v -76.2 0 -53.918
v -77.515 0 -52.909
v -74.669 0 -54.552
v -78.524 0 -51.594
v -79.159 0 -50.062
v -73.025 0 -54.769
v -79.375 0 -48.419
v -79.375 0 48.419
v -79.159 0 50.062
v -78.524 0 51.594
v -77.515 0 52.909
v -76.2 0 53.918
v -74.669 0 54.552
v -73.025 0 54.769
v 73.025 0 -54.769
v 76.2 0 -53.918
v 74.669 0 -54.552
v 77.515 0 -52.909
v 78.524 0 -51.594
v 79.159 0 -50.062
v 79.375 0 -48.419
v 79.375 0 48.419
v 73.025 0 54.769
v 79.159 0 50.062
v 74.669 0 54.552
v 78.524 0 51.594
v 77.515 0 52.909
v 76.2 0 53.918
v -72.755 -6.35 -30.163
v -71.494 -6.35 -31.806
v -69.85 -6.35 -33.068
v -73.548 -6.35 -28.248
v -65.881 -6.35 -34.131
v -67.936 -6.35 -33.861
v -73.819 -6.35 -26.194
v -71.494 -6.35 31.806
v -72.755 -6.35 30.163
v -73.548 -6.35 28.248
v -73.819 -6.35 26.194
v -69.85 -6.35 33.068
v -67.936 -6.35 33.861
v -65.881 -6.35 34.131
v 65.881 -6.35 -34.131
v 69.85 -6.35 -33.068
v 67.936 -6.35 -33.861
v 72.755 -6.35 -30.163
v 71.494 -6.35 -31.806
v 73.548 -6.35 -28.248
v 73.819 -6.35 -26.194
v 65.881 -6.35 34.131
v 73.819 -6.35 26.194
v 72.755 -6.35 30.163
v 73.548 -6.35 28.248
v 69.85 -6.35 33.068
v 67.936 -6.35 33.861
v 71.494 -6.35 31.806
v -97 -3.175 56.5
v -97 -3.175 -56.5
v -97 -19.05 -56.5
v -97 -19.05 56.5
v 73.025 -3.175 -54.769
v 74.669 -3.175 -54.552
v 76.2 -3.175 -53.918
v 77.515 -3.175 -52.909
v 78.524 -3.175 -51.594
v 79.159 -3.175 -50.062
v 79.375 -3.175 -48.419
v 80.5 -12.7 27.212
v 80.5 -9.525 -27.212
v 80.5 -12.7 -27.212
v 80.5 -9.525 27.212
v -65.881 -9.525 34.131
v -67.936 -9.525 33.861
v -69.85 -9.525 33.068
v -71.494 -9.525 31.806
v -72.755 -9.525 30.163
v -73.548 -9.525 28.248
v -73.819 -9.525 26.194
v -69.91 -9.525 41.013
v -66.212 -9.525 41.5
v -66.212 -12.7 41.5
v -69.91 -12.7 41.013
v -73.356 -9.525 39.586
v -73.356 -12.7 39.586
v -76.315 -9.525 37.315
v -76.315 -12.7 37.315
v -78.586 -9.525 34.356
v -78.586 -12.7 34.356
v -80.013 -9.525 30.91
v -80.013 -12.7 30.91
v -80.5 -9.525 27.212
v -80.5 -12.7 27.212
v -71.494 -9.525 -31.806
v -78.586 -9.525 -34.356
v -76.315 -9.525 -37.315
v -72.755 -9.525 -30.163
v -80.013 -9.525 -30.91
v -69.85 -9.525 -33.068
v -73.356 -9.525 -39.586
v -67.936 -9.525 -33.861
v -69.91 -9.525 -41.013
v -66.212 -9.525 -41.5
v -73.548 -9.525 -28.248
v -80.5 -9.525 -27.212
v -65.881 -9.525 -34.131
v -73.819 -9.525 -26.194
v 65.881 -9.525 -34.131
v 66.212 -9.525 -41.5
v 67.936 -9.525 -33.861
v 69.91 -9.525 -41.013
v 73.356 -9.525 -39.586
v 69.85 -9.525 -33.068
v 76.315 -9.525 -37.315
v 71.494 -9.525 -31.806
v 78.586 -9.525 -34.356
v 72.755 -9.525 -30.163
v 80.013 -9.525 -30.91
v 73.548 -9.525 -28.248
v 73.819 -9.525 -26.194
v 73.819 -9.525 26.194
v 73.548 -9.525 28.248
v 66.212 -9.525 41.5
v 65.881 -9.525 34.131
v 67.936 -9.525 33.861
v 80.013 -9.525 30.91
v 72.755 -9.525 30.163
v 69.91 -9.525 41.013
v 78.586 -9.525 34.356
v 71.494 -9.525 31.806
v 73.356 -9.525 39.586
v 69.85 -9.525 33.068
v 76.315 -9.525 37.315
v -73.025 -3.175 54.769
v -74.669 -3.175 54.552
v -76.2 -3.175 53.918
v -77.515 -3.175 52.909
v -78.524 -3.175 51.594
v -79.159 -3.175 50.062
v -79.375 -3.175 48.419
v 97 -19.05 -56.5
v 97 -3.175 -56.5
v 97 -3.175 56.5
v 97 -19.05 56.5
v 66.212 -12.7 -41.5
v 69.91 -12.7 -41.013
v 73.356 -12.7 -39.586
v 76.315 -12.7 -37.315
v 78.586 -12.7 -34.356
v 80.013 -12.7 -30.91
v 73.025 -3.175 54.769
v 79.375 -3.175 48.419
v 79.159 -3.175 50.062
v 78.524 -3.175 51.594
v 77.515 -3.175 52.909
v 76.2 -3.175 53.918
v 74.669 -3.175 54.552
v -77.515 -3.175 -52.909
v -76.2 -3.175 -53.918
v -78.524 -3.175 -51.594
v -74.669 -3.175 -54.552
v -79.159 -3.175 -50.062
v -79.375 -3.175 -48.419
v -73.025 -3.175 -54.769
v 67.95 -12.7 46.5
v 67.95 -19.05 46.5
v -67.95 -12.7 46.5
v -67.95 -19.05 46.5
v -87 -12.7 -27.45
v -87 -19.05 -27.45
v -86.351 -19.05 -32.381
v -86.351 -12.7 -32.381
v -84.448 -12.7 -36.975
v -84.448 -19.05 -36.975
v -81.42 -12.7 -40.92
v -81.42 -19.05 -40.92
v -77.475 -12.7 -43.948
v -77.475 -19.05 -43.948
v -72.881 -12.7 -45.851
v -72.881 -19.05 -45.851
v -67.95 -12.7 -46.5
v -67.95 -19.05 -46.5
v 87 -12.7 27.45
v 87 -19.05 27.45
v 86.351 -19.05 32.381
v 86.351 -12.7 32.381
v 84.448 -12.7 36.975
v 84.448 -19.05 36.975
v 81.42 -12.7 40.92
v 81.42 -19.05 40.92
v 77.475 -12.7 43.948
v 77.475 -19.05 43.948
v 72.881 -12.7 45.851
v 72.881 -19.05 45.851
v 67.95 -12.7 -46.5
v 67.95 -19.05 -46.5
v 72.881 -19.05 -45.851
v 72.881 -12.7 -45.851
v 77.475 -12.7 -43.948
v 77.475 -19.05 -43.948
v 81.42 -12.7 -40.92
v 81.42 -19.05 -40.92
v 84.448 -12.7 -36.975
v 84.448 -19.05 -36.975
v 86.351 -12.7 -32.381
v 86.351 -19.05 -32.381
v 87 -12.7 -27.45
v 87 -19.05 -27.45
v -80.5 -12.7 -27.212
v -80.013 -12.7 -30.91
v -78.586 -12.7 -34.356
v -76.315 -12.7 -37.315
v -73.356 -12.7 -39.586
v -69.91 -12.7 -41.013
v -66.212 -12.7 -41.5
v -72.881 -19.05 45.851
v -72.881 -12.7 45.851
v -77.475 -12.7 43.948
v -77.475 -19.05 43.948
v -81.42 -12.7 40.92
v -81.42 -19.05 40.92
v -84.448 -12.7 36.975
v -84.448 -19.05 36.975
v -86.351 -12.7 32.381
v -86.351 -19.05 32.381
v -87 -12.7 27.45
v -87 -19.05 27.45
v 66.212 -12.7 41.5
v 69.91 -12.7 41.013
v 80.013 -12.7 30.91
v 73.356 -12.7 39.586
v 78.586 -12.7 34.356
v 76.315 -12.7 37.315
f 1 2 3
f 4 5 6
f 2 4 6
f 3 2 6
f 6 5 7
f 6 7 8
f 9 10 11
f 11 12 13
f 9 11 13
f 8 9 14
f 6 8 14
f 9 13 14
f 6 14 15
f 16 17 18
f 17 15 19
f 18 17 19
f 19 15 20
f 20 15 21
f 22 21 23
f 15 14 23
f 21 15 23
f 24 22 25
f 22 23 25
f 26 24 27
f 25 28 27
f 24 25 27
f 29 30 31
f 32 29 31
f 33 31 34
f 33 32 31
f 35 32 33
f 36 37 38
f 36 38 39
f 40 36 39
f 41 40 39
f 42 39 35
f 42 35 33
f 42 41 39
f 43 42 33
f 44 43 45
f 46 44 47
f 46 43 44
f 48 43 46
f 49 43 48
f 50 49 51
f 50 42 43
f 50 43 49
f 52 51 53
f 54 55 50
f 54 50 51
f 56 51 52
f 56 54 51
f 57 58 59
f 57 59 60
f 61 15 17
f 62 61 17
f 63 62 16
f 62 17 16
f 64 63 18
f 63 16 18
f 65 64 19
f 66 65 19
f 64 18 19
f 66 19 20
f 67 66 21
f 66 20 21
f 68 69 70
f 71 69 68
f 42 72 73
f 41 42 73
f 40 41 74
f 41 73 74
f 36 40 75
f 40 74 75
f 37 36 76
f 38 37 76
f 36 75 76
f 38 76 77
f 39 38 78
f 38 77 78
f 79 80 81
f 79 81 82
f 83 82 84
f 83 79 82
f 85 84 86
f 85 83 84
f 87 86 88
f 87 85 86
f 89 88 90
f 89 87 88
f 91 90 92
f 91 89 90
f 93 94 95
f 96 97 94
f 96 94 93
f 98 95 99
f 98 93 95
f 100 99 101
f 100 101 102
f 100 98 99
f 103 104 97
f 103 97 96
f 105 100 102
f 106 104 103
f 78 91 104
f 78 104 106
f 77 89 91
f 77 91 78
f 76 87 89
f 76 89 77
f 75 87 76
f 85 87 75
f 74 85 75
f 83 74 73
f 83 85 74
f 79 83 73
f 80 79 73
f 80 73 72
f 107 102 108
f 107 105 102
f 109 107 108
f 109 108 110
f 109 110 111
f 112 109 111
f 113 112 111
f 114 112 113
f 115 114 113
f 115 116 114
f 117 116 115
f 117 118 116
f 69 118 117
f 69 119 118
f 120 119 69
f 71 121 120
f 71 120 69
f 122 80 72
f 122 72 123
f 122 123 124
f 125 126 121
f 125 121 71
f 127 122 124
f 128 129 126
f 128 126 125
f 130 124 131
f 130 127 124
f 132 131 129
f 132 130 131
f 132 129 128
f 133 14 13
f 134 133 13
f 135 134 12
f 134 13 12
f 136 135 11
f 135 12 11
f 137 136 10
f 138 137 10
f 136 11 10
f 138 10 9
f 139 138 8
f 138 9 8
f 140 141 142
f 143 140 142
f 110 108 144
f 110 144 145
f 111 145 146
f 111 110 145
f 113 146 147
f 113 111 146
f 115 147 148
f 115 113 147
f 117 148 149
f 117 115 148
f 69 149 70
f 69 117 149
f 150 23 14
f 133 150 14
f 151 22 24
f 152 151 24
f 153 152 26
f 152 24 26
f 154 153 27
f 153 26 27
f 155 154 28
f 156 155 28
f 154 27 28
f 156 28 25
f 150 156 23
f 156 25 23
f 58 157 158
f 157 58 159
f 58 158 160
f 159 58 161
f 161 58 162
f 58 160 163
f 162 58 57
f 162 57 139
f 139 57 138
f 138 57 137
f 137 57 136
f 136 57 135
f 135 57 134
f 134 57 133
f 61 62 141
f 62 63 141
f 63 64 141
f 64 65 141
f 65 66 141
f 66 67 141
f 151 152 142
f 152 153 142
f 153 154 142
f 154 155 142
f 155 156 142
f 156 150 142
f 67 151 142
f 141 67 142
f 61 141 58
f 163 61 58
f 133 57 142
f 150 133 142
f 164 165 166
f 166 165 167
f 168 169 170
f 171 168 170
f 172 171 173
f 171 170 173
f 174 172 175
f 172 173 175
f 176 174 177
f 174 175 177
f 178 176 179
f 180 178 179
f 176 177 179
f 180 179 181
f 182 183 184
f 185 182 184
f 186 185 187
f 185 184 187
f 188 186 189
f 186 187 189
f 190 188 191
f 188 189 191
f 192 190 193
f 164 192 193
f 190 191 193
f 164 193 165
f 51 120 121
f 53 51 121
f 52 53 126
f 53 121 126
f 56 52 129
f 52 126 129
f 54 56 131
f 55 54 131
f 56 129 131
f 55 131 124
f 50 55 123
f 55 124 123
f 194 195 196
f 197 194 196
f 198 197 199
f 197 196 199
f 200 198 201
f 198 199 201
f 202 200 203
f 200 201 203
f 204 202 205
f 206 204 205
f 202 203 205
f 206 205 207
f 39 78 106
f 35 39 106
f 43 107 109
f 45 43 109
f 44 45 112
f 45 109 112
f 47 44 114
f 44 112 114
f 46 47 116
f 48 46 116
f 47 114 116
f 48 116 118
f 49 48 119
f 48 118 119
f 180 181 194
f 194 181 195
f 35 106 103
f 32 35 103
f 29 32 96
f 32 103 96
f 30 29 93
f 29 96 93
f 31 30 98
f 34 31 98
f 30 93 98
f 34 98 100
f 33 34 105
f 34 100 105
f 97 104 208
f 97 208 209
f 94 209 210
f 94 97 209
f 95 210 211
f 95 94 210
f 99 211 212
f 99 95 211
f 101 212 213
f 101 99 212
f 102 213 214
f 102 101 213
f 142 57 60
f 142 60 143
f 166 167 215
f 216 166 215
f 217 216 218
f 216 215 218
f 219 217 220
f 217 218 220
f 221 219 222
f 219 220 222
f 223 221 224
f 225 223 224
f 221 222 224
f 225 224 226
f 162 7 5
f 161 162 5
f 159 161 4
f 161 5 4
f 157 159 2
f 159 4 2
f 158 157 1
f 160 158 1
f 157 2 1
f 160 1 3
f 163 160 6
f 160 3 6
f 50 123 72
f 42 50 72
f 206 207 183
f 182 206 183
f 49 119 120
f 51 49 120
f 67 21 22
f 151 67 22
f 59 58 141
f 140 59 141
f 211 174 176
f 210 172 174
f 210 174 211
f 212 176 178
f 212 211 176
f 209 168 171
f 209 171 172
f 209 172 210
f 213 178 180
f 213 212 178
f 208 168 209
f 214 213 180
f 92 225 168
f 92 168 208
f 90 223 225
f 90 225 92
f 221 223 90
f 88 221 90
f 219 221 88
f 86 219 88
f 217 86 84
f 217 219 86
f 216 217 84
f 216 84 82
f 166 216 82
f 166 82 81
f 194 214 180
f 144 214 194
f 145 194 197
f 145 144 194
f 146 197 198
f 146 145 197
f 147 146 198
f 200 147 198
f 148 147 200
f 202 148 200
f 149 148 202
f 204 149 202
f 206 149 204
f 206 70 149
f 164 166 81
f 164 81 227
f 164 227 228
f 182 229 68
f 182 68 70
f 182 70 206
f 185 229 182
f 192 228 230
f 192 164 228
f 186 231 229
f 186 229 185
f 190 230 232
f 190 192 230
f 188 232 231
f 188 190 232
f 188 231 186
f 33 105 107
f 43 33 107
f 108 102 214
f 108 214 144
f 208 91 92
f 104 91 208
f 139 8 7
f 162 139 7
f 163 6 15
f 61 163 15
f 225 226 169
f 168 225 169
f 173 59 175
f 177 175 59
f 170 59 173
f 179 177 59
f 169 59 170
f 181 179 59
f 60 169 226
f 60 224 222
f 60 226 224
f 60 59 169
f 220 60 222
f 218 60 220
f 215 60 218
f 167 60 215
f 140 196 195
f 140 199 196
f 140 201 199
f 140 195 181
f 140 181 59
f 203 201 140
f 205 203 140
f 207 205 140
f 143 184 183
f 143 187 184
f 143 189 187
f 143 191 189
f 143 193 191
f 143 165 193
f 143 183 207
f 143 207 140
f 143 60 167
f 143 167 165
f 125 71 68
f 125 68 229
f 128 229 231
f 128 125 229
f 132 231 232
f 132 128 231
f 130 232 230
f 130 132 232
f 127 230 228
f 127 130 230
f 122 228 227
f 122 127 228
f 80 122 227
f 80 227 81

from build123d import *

# Parameters (mm, degrees)
F1_DEPTH  = 3.175
F2_W      = 194
F2_H      = 113
F3_DEPTH  = 15.875
F5_DEPTH  = 12.7
F7_DEPTH  = 3.175
F9_DEPTH  = 3.175
F10_DEPTH = 6.35


with BuildPart() as f1:
    # F0 (on Front) → F1 (new body)
    with BuildSketch(Plane.XZ):
        with BuildLine():
            ThreePointArc((79.375, 48.41875), (77.5151280605, 52.9088780605), (73.025, 54.76875))
            Line((73.025, 54.76875), (-73.025, 54.76875))
            ThreePointArc((-73.025, 54.76875), (-77.5151280605, 52.9088780605), (-79.375, 48.41875))
            Line((-79.375, 48.41875), (-79.375, -48.41875))
            ThreePointArc((-79.375, -48.41875), (-77.5151280605, -52.9088780605), (-73.025, -54.76875))
            Line((-73.025, -54.76875), (73.025, -54.76875))
            ThreePointArc((73.025, -54.76875), (77.5151280605, -52.9088780605), (79.375, -48.41875))
            Line((79.375, -48.41875), (79.375, 48.41875))
        make_face()
    extrude(amount=F1_DEPTH)

    # F2 (on face) → F3 (join)
    with BuildSketch(Plane.XZ.offset(3.175)):
        Rectangle(F2_W, F2_H)
    extrude(amount=F3_DEPTH)

    # F4 (on face) → F5 (cut)
    with BuildSketch(Plane.XZ.offset(19.05)):
        with BuildLine():
            Line((67.95, 46.5), (-67.95, 46.5))
            ThreePointArc((-67.95, 46.5), (-81.4203841816, 40.9203841816), (-87, 27.45))
            Line((-87, 27.45), (-87, -27.45))
            ThreePointArc((-87, -27.45), (-81.4203841816, -40.9203841816), (-67.95, -46.5))
            Line((-67.95, -46.5), (67.95, -46.5))
            ThreePointArc((67.95, -46.5), (81.4203841816, -40.9203841816), (87, -27.45))
            Line((87, -27.45), (87, 27.45))
            ThreePointArc((87, 27.45), (81.4203841816, 40.9203841816), (67.95, 46.5))
        make_face()
    extrude(amount=-F5_DEPTH, mode=Mode.SUBTRACT)

    # F6 (on face) → F7 (join)
    with BuildSketch(Plane.XZ.offset(6.35)):
        with BuildLine():
            Line((66.2125, 41.5), (-66.2125, 41.5))
            ThreePointArc((-66.2125, 41.5), (-76.3152881362, 37.3152881362), (-80.5, 27.2125))
            Line((-80.5, 27.2125), (-80.5, -27.2125))
            ThreePointArc((-80.5, -27.2125), (-76.3152881362, -37.3152881362), (-66.2125, -41.5))
            Line((-66.2125, -41.5), (66.2125, -41.5))
            ThreePointArc((66.2125, -41.5), (76.3152881362, -37.3152881362), (80.5, -27.2125))
            Line((80.5, -27.2125), (80.5, 27.2125))
            ThreePointArc((80.5, 27.2125), (76.3152881362, 37.3152881362), (66.2125, 41.5))
        make_face()
    extrude(amount=F7_DEPTH)

    # F8 (on face) → F9 (cut)
    with BuildSketch(Plane.XZ.offset(9.525)):
        with BuildLine():
            Line((65.88125, 34.13125), (-65.88125, 34.13125))
            ThreePointArc((-65.88125, 34.13125), (-71.4939100757, 31.8064100757), (-73.81875, 26.19375))
            Line((-73.81875, 26.19375), (-73.81875, -26.19375))
            ThreePointArc((-73.81875, -26.19375), (-71.4939100757, -31.8064100757), (-65.88125, -34.13125))
            Line((-65.88125, -34.13125), (65.88125, -34.13125))
            ThreePointArc((65.88125, -34.13125), (71.4939100757, -31.8064100757), (73.81875, -26.19375))
            Line((73.81875, -26.19375), (73.81875, 26.19375))
            ThreePointArc((73.81875, 26.19375), (71.4939100757, 31.8064100757), (65.88125, 34.13125))
        make_face()
    extrude(amount=-F9_DEPTH, mode=Mode.SUBTRACT)

    # F10 (add): a face of the model
    f10_faces = [f1.faces().sort_by_distance(p)[0] for p in [
        (85.0270580343, -6.35, 0),
    ]]
    extrude(f10_faces, amount=F10_DEPTH)


solid = f1.part
